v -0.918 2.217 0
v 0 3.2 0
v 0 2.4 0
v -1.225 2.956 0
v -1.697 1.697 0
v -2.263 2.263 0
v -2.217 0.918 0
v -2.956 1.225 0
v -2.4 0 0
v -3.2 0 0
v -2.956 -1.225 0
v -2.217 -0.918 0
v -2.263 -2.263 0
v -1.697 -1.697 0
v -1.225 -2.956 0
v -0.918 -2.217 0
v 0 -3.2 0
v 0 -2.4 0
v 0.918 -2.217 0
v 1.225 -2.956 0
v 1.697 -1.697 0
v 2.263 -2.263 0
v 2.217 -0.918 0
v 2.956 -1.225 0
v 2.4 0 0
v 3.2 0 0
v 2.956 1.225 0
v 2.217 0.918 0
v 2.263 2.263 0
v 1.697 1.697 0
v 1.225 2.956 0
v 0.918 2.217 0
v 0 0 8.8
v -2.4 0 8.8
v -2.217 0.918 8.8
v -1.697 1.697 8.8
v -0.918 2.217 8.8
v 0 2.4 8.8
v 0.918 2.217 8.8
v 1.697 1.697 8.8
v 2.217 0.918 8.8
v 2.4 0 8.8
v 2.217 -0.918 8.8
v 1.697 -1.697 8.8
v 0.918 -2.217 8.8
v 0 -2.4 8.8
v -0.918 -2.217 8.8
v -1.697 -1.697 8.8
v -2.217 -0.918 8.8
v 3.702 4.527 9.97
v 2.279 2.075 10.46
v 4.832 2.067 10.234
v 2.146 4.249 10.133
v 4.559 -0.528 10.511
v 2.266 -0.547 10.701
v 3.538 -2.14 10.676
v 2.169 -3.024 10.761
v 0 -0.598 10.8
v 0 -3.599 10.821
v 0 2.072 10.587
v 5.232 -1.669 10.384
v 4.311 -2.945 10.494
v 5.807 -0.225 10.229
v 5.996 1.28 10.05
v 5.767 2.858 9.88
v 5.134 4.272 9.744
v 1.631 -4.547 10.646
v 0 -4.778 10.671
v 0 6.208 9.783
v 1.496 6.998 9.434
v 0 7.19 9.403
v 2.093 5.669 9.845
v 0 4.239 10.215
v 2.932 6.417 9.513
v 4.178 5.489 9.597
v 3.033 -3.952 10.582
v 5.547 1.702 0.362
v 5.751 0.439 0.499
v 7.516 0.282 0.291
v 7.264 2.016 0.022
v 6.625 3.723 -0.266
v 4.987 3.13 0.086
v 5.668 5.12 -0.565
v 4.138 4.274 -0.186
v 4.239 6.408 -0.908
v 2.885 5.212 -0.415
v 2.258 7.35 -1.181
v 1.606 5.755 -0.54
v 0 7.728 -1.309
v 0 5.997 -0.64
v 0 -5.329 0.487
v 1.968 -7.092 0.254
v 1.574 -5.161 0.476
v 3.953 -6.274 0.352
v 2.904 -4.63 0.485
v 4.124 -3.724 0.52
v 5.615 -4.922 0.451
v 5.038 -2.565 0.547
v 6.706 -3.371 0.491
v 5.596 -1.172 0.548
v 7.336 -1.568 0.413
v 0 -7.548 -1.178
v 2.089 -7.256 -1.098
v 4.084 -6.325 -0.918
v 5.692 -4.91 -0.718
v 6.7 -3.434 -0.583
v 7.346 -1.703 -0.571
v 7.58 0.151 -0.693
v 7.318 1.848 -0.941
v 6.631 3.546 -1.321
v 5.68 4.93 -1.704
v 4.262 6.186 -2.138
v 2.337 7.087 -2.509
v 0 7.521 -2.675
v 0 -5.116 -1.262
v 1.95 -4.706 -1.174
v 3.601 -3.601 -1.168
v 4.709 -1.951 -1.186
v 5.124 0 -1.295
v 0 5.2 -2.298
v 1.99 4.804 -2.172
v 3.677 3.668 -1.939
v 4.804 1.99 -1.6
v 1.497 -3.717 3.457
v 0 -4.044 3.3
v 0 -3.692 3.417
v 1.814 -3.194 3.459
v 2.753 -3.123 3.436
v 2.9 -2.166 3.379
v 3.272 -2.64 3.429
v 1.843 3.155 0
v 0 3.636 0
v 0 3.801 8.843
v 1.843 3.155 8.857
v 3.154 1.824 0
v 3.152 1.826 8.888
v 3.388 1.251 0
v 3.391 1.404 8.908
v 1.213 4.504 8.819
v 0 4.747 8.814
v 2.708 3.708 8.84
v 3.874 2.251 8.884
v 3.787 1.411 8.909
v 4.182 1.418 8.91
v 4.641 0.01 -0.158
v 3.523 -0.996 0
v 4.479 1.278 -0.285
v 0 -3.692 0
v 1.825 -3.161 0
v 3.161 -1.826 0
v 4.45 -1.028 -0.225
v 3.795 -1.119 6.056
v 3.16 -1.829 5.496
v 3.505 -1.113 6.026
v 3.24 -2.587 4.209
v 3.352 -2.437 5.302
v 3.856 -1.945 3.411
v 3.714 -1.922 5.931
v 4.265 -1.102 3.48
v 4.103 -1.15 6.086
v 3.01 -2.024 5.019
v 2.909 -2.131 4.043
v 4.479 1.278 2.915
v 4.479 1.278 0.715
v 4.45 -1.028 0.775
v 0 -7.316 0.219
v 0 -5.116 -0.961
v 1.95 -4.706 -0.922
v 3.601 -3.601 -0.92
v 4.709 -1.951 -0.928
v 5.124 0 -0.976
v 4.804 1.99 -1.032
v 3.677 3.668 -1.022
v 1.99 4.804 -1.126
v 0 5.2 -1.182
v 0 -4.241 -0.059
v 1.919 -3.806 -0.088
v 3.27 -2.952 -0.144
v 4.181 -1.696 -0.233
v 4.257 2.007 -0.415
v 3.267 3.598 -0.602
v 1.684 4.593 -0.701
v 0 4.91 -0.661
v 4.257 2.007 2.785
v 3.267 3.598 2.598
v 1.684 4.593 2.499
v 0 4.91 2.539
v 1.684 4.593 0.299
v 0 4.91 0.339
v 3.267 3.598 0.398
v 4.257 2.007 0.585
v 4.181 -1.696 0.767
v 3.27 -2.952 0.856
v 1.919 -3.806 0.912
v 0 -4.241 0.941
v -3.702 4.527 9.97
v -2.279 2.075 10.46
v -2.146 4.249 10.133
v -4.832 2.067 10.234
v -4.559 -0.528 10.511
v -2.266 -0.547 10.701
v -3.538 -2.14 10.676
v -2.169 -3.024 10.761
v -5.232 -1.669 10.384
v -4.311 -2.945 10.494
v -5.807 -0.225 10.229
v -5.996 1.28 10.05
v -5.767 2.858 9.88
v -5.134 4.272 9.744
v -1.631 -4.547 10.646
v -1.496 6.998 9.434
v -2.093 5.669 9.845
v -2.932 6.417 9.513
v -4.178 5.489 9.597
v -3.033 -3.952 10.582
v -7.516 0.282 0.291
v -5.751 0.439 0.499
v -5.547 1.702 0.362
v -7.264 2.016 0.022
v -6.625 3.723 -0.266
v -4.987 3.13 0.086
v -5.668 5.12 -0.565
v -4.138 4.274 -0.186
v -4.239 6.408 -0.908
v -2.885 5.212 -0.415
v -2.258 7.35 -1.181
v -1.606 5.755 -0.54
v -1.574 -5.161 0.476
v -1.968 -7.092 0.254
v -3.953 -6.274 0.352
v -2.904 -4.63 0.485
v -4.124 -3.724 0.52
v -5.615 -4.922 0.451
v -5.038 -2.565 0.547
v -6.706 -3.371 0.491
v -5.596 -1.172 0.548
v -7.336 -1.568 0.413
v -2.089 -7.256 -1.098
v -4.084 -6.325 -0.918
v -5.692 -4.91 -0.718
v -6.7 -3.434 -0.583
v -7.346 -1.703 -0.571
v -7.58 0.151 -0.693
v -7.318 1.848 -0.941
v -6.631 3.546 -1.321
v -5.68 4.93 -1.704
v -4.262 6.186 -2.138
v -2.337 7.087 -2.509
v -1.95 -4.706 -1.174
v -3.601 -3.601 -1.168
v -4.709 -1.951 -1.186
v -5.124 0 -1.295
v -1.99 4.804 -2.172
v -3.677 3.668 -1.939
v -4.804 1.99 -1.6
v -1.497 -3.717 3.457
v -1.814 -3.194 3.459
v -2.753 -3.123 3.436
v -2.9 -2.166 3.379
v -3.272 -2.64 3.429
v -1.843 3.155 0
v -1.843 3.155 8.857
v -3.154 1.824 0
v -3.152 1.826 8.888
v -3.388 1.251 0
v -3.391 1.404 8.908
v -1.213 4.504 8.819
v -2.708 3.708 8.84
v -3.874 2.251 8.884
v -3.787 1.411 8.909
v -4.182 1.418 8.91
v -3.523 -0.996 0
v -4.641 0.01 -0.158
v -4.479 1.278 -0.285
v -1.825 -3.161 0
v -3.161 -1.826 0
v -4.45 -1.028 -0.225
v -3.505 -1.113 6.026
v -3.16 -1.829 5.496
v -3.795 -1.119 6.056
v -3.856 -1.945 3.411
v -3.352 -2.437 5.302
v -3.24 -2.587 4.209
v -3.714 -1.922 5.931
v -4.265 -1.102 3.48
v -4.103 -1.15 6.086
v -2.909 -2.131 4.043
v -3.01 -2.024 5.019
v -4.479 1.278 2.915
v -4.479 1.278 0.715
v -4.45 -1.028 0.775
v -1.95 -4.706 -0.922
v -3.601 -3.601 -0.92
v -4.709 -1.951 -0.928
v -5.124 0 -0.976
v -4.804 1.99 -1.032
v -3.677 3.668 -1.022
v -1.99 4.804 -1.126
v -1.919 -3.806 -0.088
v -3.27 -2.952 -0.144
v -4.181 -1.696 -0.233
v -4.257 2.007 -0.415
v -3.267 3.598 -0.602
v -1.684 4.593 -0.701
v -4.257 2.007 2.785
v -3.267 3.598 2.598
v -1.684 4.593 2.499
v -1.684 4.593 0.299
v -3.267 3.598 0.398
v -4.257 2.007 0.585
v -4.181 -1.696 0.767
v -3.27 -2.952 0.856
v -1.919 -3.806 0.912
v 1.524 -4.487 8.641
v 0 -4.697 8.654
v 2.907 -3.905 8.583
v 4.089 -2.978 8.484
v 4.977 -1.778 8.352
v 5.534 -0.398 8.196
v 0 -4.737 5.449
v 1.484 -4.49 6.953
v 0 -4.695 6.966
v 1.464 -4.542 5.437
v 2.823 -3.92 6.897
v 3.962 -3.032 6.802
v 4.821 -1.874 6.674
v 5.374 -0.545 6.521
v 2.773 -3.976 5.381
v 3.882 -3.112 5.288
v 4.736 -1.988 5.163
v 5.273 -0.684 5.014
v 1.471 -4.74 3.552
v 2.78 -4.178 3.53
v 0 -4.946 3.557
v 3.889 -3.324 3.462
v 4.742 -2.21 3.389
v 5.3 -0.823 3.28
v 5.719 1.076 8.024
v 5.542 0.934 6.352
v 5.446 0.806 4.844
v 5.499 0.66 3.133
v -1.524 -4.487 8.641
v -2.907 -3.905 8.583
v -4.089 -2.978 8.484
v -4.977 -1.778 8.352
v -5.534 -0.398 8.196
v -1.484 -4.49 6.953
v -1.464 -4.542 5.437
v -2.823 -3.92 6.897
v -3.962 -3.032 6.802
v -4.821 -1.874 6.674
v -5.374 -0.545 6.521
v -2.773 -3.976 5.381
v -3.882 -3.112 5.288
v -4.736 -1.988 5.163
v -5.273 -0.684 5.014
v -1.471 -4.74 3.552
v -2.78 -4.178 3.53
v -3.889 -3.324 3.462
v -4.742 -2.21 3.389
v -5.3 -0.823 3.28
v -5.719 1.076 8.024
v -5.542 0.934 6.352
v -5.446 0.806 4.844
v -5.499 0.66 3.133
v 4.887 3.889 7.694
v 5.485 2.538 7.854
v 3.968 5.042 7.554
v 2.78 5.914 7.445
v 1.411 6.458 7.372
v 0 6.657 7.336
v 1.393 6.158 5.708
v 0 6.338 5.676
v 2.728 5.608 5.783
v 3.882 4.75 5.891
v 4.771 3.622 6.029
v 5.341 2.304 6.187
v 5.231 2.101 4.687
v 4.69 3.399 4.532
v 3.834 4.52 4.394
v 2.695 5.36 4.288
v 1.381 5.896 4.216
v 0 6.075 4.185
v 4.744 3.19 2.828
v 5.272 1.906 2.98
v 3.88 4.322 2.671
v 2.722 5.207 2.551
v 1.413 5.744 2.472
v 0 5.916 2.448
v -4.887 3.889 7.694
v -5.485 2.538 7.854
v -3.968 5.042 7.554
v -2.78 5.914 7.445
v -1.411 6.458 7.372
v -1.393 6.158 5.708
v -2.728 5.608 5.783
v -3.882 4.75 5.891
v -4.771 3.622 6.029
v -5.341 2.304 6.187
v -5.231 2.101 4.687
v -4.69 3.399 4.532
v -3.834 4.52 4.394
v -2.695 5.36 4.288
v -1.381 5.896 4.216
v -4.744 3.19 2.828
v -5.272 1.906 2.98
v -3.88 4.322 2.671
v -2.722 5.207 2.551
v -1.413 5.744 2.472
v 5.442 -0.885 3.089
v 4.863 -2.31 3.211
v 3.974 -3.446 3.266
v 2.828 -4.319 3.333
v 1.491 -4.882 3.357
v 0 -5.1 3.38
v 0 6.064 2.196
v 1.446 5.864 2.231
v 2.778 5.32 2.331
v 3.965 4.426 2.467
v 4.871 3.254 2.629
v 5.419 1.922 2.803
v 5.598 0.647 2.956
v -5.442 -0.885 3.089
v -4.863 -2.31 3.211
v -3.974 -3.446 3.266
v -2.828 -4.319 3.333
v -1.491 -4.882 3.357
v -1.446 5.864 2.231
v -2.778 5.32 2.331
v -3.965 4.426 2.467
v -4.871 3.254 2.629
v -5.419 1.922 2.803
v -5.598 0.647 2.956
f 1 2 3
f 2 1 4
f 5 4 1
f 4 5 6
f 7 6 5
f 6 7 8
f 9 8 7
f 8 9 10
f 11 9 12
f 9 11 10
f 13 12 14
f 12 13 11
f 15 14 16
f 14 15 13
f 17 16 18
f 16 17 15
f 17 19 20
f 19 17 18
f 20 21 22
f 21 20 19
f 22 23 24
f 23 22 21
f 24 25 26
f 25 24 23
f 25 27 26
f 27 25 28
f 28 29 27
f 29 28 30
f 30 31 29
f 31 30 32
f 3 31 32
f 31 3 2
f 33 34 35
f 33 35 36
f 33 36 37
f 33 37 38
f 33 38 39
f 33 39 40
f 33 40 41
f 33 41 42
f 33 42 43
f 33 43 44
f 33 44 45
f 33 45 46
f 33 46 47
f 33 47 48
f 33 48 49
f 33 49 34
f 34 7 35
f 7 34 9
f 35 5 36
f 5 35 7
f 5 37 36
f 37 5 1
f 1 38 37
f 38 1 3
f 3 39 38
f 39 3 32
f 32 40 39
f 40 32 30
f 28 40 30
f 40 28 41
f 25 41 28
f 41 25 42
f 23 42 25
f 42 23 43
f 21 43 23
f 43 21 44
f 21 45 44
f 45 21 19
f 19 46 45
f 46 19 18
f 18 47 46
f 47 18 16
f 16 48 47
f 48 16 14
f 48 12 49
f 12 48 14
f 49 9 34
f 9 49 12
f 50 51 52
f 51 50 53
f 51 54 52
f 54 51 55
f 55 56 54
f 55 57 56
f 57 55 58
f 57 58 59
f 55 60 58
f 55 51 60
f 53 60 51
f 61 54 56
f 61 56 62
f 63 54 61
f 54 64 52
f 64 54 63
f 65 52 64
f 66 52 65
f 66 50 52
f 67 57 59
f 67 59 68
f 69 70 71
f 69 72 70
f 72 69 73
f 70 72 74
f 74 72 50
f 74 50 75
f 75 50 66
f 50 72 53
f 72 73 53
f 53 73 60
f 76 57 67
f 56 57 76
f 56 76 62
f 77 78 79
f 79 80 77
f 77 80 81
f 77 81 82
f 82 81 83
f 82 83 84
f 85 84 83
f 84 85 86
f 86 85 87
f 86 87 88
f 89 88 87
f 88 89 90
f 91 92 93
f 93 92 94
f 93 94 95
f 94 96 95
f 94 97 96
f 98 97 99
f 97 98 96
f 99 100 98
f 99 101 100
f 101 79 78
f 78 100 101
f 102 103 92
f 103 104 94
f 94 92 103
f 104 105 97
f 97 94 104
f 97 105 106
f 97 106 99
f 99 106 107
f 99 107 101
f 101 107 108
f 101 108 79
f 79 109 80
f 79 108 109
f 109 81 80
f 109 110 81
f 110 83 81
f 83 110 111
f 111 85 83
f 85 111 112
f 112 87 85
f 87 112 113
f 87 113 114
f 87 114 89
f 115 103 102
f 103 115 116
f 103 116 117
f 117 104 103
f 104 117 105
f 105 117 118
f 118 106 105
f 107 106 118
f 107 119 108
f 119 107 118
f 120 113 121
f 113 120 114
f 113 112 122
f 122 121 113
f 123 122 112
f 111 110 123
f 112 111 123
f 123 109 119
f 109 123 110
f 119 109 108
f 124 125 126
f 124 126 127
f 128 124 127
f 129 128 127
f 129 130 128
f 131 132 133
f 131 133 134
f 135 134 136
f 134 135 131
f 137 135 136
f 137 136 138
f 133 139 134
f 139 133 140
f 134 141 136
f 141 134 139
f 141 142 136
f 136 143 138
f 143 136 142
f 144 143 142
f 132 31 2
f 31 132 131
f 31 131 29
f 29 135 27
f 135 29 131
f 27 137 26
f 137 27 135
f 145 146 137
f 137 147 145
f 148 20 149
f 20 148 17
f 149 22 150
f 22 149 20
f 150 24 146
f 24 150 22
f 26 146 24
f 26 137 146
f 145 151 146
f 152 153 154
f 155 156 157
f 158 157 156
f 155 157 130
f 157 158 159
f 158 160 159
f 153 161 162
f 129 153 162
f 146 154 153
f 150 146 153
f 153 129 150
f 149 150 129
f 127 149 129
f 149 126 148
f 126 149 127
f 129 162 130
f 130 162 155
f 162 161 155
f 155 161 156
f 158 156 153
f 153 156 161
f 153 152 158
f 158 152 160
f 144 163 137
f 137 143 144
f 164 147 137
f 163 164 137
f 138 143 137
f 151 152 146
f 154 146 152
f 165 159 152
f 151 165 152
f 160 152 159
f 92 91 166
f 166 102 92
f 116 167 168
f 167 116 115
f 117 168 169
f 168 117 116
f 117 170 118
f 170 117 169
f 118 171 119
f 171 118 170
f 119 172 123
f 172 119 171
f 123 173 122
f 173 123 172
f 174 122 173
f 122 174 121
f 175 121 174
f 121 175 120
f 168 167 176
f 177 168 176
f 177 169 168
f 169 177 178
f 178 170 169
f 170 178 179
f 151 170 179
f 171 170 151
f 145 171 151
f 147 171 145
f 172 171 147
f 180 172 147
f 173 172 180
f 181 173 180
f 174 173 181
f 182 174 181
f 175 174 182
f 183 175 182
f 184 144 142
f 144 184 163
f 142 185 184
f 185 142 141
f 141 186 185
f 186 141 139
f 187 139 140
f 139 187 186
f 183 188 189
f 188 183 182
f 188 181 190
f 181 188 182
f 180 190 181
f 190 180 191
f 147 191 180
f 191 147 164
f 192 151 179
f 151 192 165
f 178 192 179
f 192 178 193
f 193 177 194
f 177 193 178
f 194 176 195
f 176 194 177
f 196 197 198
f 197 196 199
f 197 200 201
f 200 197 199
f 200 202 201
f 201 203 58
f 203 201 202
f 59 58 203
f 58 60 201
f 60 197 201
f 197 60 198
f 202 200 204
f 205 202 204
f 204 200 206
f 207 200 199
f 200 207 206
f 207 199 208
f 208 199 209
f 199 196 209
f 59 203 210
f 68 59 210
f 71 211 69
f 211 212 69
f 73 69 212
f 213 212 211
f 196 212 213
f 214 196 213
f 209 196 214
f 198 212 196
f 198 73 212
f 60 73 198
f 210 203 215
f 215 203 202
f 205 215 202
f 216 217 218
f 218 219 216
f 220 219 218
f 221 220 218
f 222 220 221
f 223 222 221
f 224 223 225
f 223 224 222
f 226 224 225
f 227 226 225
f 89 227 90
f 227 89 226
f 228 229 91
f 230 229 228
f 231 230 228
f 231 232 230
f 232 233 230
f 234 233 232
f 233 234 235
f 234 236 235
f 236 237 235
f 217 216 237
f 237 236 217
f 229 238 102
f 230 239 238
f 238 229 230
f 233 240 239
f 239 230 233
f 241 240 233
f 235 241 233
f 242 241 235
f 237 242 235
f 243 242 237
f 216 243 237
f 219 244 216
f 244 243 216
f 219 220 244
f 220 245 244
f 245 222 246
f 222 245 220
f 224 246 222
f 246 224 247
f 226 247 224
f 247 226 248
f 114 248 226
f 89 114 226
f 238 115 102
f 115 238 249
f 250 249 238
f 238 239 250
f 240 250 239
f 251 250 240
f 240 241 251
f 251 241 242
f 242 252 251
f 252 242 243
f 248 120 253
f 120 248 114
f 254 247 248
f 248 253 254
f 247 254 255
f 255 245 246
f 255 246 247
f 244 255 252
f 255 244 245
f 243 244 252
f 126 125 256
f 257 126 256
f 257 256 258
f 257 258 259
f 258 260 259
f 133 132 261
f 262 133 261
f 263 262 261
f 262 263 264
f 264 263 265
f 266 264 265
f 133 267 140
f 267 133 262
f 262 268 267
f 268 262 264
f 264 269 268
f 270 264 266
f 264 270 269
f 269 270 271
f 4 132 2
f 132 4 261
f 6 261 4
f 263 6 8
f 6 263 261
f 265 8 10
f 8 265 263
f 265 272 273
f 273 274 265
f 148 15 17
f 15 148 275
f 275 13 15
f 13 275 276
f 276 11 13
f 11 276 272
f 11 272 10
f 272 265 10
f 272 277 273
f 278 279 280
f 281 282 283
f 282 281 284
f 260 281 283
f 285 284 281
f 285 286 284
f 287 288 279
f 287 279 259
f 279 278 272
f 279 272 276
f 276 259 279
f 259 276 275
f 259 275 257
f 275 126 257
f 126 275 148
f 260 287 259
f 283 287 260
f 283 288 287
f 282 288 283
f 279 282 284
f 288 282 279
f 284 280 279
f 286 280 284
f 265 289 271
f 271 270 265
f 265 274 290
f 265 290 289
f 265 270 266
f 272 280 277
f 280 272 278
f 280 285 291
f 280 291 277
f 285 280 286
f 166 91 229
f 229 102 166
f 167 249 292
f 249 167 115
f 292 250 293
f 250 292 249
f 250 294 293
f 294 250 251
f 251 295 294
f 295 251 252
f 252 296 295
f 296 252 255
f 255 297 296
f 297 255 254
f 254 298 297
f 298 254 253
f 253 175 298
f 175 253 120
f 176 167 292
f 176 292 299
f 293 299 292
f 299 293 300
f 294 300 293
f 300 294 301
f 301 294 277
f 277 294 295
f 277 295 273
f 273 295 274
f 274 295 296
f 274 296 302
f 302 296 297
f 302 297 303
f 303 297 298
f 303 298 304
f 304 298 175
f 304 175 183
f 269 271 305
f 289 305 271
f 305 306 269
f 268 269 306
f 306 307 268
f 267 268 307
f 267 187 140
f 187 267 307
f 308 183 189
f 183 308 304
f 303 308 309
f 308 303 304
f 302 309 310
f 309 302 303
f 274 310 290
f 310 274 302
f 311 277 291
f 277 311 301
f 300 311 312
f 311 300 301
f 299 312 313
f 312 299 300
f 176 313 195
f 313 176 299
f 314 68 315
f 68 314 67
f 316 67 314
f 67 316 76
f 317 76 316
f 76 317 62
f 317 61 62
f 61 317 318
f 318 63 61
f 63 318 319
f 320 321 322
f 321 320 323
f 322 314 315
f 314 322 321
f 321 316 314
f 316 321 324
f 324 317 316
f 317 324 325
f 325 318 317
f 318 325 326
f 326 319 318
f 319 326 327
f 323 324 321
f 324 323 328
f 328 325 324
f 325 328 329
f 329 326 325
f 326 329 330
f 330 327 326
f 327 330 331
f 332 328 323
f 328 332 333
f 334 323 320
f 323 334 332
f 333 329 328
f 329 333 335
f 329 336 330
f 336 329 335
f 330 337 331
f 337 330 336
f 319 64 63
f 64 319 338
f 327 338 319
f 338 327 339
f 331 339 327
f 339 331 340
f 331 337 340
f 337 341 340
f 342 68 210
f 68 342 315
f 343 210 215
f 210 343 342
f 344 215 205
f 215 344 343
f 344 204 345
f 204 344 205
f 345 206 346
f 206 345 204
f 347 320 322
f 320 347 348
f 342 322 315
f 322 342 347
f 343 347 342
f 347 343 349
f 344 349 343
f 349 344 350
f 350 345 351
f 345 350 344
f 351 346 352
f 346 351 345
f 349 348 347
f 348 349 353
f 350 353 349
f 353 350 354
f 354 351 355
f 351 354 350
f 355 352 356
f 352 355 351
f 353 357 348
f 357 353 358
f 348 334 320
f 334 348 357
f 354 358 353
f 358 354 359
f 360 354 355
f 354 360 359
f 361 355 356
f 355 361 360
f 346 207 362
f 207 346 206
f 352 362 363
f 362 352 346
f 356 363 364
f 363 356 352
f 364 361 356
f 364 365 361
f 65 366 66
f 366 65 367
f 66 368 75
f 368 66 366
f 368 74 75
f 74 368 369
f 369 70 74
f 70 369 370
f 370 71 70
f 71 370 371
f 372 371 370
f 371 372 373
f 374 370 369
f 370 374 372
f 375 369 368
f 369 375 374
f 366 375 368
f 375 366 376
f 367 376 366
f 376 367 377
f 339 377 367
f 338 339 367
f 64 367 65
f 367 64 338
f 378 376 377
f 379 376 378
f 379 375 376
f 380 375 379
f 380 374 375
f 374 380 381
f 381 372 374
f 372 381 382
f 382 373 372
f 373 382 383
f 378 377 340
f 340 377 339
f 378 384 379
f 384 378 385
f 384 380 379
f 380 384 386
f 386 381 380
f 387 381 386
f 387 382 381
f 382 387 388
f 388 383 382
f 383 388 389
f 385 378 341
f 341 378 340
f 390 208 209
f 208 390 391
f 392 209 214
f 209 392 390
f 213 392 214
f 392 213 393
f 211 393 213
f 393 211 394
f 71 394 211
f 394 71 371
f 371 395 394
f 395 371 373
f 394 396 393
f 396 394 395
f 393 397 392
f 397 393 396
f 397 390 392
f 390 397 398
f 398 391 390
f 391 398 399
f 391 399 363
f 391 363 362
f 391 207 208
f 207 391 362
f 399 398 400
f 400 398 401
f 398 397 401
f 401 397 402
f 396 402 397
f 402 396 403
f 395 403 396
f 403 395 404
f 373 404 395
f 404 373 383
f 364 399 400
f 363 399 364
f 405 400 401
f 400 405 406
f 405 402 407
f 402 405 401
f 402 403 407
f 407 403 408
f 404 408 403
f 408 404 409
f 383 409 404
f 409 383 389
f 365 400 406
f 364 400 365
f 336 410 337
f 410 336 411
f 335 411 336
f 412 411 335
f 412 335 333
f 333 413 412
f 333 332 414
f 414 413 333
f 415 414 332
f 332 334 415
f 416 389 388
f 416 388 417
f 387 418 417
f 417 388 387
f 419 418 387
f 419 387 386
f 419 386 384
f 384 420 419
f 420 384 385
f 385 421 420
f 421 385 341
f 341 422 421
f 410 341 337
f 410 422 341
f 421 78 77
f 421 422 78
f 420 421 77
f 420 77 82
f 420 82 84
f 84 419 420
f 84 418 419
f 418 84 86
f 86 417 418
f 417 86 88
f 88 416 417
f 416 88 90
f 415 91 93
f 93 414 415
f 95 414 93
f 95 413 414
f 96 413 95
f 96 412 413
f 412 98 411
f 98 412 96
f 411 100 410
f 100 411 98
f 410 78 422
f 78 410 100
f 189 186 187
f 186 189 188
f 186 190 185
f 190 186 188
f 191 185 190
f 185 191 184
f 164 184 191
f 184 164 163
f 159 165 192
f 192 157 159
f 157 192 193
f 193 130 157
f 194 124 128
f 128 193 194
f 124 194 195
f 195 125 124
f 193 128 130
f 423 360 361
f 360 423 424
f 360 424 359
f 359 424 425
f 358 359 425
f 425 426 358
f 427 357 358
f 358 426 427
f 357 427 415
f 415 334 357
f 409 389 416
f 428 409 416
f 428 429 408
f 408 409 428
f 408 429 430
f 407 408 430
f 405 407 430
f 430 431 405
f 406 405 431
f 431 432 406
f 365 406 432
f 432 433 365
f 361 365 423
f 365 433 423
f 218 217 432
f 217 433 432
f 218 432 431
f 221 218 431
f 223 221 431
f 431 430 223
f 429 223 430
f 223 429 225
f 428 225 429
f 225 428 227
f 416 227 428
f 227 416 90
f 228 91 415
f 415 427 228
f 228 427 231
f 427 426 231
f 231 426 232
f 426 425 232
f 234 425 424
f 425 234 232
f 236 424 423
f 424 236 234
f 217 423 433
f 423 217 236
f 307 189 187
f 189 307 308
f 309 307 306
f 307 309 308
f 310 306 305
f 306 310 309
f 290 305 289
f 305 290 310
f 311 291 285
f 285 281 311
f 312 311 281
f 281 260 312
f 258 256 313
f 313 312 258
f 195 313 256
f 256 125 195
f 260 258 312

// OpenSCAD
use <../lib.scad>
use <s/101777s01.scad>
use <s/101777s02.scad>
use <s/101777s04.scad>
use <s/101777s05.scad>
function ldraw_lib__101777() = [
// 0 Minifig Top Hat with Band
// 0 Name: 101777.dat
// 0 Author: Philippe Hurbain [Philo]
// 0 !LDRAW_ORG Part UPDATE 2023-07
// 0 !LICENSE Licensed under CC BY 4.0 : see CAreadme.txt
// 
// 0 BFC CERTIFY CCW
  [0,"BFC","CERTIFY"],
  [0,"BFC","CCW"],
// 
// 0 !CATEGORY Minifig Headwear
// 
// 0 !HISTORY 2023-05-12 {LEGO Instructions App} Original part shape
// 0 !HISTORY 2023-05-15 [Philo] File preparation for LDraw Parts Tracker
// 0 !HISTORY 2023-12-31 [OrionP] Official Update 2023-07
// 
// 
// 1 16 0 0 0 1 0 0 0 1 0 0 0 1 s\101777s01.dat
  [1,16,0,0,0,1,0,0,0,1,0,0,0,1, ldraw_lib__s__101777s01()],
// 1 16 0 0 0 1 0 0 0 1 0 0 0 1 s\101777s04.dat
  [1,16,0,0,0,1,0,0,0,1,0,0,0,1, ldraw_lib__s__101777s04()],
// 1 16 0 0 0 -1 0 0 0 1 0 0 0 1 s\101777s04.dat
  [1,16,0,0,0,-1,0,0,0,1,0,0,0,1, ldraw_lib__s__101777s04()],
// 1 16 0 0 0 1 0 0 0 1 0 0 0 1 s\101777s05.dat
  [1,16,0,0,0,1,0,0,0,1,0,0,0,1, ldraw_lib__s__101777s05()],
// 1 16 0 0 0 -1 0 0 0 1 0 0 0 1 s\101777s05.dat
  [1,16,0,0,0,-1,0,0,0,1,0,0,0,1, ldraw_lib__s__101777s05()],
// 1 16 0 0 0 1 0 0 0 1 0 0 0 1 s\101777s02.dat
  [1,16,0,0,0,1,0,0,0,1,0,0,0,1, ldraw_lib__s__101777s02()],
// 1 16 0 0 0 -1 0 0 0 1 0 0 0 1 s\101777s02.dat
  [1,16,0,0,0,-1,0,0,0,1,0,0,0,1, ldraw_lib__s__101777s02()],
];
module ldraw_lib__101777(step=0, col=false, unit=2/5, alt=false, line=0.2, solid=!$preview)
    makepoly(ldraw_lib__101777(), step=step, col=col, unit=unit, alt=alt, line=line, solid=solid);
ldraw_lib__101777(line=0.2);
